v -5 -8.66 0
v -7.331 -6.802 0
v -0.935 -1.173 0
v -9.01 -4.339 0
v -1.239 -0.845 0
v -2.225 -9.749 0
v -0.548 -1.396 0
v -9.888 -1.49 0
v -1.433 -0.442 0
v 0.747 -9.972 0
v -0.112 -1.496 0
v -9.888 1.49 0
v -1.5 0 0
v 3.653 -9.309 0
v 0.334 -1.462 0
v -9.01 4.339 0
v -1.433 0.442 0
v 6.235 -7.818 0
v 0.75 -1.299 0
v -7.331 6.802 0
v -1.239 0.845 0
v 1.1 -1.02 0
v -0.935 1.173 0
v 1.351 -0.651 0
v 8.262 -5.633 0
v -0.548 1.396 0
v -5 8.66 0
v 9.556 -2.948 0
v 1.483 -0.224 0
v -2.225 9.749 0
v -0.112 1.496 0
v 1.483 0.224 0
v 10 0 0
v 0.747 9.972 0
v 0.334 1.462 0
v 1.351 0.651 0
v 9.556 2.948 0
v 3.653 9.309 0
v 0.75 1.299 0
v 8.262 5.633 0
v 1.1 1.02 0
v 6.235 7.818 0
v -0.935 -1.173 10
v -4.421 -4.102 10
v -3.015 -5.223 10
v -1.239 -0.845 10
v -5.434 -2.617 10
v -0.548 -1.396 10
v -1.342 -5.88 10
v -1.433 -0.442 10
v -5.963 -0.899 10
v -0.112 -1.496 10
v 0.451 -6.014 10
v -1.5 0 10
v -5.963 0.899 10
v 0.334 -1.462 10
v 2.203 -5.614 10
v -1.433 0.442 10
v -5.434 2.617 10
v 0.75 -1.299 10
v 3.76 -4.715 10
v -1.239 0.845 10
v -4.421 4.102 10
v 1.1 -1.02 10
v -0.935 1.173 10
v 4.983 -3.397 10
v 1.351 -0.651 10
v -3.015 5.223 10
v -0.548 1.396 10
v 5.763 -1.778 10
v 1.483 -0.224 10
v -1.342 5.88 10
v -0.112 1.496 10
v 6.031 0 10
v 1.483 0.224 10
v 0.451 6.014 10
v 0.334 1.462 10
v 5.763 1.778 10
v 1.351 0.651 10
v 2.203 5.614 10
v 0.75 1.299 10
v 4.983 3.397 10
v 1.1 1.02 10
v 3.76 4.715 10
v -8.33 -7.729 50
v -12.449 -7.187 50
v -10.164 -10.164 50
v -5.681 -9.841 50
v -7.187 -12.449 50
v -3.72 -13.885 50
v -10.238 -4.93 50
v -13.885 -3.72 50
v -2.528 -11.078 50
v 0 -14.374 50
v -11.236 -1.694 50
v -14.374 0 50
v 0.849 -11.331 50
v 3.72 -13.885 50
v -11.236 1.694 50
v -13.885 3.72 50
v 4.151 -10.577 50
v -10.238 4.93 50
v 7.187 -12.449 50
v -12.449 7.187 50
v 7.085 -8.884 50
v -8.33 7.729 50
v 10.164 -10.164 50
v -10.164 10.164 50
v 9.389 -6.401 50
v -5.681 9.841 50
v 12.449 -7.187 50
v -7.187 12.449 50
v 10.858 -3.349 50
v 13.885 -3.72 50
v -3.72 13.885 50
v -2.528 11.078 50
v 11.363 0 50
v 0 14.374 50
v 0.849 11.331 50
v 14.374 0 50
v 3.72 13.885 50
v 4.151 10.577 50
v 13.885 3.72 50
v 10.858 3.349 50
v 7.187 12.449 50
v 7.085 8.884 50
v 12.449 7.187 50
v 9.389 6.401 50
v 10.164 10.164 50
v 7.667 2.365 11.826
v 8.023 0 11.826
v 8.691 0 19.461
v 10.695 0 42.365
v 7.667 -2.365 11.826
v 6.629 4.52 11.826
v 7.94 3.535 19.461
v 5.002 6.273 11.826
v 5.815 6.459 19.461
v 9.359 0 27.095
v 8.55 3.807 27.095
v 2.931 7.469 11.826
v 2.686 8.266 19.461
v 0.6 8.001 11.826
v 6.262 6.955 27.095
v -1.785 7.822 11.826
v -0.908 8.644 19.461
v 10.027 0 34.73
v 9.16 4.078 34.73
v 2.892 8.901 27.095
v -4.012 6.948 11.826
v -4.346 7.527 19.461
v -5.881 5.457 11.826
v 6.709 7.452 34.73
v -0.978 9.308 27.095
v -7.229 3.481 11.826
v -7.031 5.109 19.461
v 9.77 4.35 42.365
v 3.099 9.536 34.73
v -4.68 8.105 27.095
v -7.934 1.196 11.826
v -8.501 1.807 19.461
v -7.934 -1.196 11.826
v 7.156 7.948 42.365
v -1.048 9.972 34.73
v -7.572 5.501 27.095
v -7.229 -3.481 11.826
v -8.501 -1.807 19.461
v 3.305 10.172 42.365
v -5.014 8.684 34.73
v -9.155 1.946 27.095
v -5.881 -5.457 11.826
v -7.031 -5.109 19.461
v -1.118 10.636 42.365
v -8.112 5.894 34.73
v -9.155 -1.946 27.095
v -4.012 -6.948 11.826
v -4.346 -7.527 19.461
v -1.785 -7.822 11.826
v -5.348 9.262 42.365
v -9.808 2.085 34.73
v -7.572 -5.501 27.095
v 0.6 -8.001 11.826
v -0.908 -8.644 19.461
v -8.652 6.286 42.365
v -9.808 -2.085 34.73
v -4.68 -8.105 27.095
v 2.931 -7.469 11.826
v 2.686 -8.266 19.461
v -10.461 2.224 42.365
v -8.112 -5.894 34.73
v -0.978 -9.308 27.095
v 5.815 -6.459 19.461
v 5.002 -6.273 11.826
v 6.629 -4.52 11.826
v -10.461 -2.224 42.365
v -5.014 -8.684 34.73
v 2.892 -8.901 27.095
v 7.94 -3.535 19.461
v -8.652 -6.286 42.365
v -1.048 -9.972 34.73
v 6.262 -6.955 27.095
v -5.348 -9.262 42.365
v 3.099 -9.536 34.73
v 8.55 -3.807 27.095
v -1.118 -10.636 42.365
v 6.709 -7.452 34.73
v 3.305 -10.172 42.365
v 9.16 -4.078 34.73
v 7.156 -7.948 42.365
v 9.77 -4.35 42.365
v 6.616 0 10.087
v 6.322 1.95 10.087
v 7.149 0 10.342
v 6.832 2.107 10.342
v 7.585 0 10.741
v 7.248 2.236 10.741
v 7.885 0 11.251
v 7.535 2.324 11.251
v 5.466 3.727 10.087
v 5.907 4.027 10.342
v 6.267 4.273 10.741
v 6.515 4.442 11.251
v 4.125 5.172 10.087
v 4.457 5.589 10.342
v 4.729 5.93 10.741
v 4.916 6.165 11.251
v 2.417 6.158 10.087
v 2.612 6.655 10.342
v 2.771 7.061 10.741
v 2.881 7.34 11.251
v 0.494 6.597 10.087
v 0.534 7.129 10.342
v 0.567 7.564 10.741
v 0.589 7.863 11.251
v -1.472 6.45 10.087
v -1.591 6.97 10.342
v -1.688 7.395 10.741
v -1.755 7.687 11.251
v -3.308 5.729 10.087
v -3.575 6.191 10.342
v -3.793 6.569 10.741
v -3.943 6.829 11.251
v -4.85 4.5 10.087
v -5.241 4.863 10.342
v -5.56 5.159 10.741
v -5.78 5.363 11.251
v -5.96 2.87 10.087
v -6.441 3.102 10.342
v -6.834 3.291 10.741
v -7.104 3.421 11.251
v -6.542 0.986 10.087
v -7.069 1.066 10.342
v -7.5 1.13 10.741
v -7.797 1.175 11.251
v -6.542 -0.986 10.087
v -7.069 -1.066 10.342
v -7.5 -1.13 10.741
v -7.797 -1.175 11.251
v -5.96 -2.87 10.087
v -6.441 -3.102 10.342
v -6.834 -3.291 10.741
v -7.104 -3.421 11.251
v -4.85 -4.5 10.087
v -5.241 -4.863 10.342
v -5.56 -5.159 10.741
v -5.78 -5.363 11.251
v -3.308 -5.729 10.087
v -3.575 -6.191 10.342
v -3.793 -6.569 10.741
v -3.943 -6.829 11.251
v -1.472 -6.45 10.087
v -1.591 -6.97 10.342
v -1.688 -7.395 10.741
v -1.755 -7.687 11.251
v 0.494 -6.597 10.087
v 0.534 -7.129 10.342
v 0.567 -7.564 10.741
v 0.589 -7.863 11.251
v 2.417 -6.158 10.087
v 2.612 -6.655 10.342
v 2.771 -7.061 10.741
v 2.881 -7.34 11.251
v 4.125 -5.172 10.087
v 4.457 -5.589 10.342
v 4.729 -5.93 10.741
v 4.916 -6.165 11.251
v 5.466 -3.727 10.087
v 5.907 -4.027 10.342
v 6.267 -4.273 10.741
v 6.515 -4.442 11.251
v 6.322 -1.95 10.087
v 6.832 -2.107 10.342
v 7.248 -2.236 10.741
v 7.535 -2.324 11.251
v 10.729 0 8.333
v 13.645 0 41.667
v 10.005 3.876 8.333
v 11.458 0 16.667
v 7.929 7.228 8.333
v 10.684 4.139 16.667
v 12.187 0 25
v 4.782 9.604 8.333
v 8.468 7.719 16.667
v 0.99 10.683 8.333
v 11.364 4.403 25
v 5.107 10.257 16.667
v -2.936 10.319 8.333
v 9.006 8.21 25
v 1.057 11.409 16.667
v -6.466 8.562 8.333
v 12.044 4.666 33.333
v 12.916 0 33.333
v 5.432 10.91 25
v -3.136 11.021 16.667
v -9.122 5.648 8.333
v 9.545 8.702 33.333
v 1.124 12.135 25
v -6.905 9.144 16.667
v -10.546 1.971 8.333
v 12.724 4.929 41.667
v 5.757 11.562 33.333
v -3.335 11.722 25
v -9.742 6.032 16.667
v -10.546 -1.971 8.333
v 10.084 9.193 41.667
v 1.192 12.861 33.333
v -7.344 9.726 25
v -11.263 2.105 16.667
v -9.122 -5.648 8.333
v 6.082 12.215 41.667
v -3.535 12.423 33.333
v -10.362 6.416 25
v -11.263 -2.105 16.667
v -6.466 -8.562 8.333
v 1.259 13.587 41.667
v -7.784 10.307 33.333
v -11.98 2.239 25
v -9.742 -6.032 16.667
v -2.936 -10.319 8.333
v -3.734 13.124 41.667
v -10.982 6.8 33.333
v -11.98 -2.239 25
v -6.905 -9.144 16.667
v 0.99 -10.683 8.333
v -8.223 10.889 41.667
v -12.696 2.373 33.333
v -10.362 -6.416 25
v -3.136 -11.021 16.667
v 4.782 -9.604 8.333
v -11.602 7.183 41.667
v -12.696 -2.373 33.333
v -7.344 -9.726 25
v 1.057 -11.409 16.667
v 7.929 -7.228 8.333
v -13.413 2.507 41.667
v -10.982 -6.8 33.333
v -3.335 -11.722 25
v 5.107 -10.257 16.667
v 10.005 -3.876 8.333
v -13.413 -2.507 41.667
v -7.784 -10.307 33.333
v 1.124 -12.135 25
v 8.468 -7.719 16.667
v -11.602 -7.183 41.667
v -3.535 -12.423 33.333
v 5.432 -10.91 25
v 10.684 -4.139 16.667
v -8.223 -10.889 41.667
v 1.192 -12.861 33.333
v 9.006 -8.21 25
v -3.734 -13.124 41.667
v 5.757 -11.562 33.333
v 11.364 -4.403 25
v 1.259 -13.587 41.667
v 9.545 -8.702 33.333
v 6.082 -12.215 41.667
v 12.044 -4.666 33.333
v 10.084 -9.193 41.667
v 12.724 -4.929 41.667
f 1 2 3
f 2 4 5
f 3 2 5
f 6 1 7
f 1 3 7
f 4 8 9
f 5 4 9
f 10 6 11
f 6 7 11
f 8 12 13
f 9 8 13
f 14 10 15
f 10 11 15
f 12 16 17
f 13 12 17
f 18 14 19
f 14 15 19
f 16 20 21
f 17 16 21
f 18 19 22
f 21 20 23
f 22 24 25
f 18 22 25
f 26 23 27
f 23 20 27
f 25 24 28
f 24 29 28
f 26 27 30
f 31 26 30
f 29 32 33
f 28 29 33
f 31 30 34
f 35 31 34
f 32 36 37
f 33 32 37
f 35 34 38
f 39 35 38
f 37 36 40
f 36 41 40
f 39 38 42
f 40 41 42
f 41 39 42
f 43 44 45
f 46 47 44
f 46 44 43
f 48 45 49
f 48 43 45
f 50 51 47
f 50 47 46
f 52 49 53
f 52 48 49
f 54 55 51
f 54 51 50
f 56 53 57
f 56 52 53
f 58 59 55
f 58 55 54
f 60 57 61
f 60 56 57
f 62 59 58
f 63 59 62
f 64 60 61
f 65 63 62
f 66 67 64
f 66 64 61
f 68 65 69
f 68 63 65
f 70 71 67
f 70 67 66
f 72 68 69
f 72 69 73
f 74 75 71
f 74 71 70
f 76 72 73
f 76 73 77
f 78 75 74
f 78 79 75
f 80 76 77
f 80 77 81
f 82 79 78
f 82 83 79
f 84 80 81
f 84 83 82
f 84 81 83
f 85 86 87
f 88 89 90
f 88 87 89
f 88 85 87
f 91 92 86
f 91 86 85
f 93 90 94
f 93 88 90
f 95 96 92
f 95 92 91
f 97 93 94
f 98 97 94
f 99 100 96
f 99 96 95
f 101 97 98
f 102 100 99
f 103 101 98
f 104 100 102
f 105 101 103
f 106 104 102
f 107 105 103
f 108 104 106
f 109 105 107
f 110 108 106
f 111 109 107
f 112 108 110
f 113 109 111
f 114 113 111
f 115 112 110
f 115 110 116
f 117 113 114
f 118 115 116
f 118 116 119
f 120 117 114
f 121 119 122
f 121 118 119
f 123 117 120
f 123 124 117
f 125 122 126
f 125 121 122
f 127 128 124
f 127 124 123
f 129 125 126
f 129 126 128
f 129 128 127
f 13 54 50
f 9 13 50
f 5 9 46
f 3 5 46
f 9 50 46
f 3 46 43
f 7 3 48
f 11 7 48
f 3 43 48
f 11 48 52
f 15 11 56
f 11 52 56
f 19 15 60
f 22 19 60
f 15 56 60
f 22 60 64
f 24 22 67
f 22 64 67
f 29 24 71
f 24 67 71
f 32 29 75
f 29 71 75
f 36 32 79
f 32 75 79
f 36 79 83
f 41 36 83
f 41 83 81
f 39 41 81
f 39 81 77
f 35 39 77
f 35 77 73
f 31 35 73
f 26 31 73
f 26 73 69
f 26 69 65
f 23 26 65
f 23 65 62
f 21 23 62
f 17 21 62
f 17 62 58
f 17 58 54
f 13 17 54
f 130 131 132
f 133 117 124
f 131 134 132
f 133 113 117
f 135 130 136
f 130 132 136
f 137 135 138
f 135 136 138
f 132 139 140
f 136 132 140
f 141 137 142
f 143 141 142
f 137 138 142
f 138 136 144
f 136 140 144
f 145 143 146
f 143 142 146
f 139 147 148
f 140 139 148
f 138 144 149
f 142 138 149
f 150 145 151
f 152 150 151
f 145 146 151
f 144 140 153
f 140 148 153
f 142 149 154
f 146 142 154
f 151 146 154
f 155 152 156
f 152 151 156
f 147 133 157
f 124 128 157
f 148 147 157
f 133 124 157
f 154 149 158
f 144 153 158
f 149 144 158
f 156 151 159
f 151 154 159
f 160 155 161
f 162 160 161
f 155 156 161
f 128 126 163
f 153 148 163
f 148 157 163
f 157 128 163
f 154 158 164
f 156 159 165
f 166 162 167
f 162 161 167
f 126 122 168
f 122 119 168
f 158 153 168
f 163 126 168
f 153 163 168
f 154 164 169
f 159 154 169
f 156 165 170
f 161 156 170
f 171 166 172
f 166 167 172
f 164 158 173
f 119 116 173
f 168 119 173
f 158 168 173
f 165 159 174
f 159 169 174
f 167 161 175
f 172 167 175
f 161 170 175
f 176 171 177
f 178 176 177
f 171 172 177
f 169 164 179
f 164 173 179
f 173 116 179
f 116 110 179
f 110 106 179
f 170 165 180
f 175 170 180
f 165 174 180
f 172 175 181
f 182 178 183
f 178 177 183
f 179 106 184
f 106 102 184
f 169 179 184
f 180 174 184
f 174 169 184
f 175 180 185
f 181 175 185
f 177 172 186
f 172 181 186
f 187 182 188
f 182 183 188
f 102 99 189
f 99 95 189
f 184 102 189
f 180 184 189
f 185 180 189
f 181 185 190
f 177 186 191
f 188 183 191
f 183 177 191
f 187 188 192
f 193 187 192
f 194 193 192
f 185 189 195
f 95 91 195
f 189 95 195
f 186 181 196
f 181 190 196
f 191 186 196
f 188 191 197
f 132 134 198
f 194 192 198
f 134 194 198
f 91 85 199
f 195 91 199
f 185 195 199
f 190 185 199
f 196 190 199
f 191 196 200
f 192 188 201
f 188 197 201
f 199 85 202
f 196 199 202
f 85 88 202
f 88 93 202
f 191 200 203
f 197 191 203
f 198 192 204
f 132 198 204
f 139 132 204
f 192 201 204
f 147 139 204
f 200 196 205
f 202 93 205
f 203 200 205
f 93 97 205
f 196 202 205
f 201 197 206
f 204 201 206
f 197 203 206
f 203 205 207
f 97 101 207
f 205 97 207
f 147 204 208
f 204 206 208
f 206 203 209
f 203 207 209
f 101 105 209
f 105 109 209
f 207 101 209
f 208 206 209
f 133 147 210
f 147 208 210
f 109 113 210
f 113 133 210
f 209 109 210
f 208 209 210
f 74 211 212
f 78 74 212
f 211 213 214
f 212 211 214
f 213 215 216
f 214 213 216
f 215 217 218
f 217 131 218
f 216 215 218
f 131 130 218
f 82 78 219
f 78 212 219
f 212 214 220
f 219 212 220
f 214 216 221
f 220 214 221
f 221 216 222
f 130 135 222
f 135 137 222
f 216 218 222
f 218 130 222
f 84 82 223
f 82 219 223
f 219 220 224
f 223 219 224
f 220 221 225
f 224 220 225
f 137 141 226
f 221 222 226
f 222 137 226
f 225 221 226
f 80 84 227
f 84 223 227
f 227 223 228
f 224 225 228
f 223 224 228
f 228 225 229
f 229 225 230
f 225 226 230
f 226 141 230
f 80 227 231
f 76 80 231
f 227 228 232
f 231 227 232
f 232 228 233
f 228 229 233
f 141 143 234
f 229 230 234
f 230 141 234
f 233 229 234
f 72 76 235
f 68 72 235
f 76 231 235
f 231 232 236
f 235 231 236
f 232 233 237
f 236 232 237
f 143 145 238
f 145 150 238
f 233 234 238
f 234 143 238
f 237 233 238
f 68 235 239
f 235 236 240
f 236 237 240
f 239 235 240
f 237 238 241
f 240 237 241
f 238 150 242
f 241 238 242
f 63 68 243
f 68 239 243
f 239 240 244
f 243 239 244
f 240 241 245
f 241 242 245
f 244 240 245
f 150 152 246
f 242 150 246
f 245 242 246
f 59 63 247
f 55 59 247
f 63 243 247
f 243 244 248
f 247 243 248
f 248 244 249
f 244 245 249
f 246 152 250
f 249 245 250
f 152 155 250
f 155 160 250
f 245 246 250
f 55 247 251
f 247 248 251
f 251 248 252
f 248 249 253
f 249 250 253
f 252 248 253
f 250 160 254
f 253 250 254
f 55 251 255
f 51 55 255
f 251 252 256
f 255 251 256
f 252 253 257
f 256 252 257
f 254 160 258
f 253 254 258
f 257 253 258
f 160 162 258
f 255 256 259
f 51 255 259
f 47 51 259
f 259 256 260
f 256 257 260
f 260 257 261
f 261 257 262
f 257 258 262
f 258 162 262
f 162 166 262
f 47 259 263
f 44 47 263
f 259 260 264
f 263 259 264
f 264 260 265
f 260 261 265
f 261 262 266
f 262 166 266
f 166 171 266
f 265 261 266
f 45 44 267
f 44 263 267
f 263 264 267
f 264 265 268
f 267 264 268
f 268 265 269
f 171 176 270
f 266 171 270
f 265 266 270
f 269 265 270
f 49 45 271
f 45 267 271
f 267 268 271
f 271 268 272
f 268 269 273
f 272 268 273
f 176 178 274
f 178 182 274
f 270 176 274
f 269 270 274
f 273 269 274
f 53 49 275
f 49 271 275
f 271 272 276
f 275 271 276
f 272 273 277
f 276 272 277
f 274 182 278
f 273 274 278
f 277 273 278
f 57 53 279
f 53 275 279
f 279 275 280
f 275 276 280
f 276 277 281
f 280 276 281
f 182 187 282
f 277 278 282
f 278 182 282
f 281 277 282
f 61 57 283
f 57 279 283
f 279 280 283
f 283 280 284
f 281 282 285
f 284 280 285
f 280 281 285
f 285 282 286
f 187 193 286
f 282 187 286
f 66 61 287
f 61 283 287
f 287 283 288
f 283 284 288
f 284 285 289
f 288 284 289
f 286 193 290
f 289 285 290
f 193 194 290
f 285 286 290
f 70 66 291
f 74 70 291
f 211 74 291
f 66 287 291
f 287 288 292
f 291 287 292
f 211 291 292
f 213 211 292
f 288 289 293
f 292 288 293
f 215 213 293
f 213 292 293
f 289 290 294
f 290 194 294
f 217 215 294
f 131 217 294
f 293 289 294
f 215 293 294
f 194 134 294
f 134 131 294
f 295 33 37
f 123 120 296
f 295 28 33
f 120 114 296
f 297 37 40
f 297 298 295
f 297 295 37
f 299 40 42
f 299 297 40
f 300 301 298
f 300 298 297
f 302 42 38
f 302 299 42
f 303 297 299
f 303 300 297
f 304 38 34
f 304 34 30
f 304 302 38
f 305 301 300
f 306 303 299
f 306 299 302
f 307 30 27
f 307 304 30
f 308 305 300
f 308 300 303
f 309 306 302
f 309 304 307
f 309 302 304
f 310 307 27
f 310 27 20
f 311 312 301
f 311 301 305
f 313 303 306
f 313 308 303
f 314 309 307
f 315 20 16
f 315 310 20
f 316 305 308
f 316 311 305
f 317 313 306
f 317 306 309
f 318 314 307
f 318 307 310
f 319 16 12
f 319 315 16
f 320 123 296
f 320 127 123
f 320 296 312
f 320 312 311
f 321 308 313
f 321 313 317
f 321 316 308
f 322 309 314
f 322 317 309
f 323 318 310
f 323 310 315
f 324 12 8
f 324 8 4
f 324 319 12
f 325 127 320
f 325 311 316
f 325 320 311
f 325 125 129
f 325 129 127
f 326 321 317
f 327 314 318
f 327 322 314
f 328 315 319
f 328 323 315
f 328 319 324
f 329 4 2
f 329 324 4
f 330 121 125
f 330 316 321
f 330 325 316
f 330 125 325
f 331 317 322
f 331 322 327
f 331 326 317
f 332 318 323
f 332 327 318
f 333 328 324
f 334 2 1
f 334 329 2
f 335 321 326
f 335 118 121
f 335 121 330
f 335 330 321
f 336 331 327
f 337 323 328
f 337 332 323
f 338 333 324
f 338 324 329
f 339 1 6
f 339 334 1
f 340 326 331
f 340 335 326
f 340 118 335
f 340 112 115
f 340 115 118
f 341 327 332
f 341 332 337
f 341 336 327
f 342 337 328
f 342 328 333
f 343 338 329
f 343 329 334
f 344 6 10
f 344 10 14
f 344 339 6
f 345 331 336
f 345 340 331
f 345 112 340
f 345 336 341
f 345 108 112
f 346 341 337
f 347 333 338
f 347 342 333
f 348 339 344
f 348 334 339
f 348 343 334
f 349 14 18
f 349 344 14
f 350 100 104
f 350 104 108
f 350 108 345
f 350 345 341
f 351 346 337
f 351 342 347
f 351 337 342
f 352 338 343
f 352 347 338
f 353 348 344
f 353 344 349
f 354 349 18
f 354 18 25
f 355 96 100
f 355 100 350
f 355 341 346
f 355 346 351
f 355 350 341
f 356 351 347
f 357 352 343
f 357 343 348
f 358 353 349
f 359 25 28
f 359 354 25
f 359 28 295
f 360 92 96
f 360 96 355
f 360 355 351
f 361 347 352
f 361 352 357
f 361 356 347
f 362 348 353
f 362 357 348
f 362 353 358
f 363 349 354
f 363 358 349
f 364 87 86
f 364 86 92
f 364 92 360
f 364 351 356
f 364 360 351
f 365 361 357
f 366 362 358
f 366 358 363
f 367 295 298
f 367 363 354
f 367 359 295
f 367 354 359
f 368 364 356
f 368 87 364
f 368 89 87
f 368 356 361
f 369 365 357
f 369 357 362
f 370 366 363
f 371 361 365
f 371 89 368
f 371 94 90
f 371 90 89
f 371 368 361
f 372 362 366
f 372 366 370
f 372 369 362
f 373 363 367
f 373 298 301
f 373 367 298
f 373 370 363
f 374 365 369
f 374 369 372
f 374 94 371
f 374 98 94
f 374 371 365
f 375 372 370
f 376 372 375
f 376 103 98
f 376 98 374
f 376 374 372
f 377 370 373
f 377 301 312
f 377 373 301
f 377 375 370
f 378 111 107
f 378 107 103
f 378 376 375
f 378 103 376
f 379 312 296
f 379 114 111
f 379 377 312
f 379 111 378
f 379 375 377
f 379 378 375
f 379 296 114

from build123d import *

# Parameters (mm, degrees)
F0_R     = 10
F1_DEPTH = 50
F1_TAPER = -5
F2_T     = -3
F3_DEPTH = 10
F4_D     = 3
F5_R     = 2


with BuildPart() as f1:
    # F0 (on Top) → F1 (new body)
    with BuildSketch(Plane.XY):
        Circle(F0_R)
    extrude(amount=F1_DEPTH, taper=F1_TAPER)

    # F2
    f2_openings = [f1.faces().sort_by_distance(p)[0] for p in [
        (0, 0, 50),
    ]]
    offset(amount=F2_T, openings=f2_openings, kind=Kind.INTERSECTION)

    # F0 (on Top) → F3 (join)
    with BuildSketch(Plane.XY):
        Circle(F0_R)
    extrude(amount=F3_DEPTH)

    # F4 (through all)
    with Locations(Plane(origin=(0, 0, 0), x_dir=(1, 0, 0), z_dir=(0, 0, -1))):
        with Locations((0, 0)):
            Hole(F4_D / 2)

    # F5
    f5_edges = [f1.edges().sort_by_distance(p)[0] for p in [
        (-7.863427, 0, 10),
    ]]
    fillet(f5_edges, radius=F5_R)


solid = f1.part
